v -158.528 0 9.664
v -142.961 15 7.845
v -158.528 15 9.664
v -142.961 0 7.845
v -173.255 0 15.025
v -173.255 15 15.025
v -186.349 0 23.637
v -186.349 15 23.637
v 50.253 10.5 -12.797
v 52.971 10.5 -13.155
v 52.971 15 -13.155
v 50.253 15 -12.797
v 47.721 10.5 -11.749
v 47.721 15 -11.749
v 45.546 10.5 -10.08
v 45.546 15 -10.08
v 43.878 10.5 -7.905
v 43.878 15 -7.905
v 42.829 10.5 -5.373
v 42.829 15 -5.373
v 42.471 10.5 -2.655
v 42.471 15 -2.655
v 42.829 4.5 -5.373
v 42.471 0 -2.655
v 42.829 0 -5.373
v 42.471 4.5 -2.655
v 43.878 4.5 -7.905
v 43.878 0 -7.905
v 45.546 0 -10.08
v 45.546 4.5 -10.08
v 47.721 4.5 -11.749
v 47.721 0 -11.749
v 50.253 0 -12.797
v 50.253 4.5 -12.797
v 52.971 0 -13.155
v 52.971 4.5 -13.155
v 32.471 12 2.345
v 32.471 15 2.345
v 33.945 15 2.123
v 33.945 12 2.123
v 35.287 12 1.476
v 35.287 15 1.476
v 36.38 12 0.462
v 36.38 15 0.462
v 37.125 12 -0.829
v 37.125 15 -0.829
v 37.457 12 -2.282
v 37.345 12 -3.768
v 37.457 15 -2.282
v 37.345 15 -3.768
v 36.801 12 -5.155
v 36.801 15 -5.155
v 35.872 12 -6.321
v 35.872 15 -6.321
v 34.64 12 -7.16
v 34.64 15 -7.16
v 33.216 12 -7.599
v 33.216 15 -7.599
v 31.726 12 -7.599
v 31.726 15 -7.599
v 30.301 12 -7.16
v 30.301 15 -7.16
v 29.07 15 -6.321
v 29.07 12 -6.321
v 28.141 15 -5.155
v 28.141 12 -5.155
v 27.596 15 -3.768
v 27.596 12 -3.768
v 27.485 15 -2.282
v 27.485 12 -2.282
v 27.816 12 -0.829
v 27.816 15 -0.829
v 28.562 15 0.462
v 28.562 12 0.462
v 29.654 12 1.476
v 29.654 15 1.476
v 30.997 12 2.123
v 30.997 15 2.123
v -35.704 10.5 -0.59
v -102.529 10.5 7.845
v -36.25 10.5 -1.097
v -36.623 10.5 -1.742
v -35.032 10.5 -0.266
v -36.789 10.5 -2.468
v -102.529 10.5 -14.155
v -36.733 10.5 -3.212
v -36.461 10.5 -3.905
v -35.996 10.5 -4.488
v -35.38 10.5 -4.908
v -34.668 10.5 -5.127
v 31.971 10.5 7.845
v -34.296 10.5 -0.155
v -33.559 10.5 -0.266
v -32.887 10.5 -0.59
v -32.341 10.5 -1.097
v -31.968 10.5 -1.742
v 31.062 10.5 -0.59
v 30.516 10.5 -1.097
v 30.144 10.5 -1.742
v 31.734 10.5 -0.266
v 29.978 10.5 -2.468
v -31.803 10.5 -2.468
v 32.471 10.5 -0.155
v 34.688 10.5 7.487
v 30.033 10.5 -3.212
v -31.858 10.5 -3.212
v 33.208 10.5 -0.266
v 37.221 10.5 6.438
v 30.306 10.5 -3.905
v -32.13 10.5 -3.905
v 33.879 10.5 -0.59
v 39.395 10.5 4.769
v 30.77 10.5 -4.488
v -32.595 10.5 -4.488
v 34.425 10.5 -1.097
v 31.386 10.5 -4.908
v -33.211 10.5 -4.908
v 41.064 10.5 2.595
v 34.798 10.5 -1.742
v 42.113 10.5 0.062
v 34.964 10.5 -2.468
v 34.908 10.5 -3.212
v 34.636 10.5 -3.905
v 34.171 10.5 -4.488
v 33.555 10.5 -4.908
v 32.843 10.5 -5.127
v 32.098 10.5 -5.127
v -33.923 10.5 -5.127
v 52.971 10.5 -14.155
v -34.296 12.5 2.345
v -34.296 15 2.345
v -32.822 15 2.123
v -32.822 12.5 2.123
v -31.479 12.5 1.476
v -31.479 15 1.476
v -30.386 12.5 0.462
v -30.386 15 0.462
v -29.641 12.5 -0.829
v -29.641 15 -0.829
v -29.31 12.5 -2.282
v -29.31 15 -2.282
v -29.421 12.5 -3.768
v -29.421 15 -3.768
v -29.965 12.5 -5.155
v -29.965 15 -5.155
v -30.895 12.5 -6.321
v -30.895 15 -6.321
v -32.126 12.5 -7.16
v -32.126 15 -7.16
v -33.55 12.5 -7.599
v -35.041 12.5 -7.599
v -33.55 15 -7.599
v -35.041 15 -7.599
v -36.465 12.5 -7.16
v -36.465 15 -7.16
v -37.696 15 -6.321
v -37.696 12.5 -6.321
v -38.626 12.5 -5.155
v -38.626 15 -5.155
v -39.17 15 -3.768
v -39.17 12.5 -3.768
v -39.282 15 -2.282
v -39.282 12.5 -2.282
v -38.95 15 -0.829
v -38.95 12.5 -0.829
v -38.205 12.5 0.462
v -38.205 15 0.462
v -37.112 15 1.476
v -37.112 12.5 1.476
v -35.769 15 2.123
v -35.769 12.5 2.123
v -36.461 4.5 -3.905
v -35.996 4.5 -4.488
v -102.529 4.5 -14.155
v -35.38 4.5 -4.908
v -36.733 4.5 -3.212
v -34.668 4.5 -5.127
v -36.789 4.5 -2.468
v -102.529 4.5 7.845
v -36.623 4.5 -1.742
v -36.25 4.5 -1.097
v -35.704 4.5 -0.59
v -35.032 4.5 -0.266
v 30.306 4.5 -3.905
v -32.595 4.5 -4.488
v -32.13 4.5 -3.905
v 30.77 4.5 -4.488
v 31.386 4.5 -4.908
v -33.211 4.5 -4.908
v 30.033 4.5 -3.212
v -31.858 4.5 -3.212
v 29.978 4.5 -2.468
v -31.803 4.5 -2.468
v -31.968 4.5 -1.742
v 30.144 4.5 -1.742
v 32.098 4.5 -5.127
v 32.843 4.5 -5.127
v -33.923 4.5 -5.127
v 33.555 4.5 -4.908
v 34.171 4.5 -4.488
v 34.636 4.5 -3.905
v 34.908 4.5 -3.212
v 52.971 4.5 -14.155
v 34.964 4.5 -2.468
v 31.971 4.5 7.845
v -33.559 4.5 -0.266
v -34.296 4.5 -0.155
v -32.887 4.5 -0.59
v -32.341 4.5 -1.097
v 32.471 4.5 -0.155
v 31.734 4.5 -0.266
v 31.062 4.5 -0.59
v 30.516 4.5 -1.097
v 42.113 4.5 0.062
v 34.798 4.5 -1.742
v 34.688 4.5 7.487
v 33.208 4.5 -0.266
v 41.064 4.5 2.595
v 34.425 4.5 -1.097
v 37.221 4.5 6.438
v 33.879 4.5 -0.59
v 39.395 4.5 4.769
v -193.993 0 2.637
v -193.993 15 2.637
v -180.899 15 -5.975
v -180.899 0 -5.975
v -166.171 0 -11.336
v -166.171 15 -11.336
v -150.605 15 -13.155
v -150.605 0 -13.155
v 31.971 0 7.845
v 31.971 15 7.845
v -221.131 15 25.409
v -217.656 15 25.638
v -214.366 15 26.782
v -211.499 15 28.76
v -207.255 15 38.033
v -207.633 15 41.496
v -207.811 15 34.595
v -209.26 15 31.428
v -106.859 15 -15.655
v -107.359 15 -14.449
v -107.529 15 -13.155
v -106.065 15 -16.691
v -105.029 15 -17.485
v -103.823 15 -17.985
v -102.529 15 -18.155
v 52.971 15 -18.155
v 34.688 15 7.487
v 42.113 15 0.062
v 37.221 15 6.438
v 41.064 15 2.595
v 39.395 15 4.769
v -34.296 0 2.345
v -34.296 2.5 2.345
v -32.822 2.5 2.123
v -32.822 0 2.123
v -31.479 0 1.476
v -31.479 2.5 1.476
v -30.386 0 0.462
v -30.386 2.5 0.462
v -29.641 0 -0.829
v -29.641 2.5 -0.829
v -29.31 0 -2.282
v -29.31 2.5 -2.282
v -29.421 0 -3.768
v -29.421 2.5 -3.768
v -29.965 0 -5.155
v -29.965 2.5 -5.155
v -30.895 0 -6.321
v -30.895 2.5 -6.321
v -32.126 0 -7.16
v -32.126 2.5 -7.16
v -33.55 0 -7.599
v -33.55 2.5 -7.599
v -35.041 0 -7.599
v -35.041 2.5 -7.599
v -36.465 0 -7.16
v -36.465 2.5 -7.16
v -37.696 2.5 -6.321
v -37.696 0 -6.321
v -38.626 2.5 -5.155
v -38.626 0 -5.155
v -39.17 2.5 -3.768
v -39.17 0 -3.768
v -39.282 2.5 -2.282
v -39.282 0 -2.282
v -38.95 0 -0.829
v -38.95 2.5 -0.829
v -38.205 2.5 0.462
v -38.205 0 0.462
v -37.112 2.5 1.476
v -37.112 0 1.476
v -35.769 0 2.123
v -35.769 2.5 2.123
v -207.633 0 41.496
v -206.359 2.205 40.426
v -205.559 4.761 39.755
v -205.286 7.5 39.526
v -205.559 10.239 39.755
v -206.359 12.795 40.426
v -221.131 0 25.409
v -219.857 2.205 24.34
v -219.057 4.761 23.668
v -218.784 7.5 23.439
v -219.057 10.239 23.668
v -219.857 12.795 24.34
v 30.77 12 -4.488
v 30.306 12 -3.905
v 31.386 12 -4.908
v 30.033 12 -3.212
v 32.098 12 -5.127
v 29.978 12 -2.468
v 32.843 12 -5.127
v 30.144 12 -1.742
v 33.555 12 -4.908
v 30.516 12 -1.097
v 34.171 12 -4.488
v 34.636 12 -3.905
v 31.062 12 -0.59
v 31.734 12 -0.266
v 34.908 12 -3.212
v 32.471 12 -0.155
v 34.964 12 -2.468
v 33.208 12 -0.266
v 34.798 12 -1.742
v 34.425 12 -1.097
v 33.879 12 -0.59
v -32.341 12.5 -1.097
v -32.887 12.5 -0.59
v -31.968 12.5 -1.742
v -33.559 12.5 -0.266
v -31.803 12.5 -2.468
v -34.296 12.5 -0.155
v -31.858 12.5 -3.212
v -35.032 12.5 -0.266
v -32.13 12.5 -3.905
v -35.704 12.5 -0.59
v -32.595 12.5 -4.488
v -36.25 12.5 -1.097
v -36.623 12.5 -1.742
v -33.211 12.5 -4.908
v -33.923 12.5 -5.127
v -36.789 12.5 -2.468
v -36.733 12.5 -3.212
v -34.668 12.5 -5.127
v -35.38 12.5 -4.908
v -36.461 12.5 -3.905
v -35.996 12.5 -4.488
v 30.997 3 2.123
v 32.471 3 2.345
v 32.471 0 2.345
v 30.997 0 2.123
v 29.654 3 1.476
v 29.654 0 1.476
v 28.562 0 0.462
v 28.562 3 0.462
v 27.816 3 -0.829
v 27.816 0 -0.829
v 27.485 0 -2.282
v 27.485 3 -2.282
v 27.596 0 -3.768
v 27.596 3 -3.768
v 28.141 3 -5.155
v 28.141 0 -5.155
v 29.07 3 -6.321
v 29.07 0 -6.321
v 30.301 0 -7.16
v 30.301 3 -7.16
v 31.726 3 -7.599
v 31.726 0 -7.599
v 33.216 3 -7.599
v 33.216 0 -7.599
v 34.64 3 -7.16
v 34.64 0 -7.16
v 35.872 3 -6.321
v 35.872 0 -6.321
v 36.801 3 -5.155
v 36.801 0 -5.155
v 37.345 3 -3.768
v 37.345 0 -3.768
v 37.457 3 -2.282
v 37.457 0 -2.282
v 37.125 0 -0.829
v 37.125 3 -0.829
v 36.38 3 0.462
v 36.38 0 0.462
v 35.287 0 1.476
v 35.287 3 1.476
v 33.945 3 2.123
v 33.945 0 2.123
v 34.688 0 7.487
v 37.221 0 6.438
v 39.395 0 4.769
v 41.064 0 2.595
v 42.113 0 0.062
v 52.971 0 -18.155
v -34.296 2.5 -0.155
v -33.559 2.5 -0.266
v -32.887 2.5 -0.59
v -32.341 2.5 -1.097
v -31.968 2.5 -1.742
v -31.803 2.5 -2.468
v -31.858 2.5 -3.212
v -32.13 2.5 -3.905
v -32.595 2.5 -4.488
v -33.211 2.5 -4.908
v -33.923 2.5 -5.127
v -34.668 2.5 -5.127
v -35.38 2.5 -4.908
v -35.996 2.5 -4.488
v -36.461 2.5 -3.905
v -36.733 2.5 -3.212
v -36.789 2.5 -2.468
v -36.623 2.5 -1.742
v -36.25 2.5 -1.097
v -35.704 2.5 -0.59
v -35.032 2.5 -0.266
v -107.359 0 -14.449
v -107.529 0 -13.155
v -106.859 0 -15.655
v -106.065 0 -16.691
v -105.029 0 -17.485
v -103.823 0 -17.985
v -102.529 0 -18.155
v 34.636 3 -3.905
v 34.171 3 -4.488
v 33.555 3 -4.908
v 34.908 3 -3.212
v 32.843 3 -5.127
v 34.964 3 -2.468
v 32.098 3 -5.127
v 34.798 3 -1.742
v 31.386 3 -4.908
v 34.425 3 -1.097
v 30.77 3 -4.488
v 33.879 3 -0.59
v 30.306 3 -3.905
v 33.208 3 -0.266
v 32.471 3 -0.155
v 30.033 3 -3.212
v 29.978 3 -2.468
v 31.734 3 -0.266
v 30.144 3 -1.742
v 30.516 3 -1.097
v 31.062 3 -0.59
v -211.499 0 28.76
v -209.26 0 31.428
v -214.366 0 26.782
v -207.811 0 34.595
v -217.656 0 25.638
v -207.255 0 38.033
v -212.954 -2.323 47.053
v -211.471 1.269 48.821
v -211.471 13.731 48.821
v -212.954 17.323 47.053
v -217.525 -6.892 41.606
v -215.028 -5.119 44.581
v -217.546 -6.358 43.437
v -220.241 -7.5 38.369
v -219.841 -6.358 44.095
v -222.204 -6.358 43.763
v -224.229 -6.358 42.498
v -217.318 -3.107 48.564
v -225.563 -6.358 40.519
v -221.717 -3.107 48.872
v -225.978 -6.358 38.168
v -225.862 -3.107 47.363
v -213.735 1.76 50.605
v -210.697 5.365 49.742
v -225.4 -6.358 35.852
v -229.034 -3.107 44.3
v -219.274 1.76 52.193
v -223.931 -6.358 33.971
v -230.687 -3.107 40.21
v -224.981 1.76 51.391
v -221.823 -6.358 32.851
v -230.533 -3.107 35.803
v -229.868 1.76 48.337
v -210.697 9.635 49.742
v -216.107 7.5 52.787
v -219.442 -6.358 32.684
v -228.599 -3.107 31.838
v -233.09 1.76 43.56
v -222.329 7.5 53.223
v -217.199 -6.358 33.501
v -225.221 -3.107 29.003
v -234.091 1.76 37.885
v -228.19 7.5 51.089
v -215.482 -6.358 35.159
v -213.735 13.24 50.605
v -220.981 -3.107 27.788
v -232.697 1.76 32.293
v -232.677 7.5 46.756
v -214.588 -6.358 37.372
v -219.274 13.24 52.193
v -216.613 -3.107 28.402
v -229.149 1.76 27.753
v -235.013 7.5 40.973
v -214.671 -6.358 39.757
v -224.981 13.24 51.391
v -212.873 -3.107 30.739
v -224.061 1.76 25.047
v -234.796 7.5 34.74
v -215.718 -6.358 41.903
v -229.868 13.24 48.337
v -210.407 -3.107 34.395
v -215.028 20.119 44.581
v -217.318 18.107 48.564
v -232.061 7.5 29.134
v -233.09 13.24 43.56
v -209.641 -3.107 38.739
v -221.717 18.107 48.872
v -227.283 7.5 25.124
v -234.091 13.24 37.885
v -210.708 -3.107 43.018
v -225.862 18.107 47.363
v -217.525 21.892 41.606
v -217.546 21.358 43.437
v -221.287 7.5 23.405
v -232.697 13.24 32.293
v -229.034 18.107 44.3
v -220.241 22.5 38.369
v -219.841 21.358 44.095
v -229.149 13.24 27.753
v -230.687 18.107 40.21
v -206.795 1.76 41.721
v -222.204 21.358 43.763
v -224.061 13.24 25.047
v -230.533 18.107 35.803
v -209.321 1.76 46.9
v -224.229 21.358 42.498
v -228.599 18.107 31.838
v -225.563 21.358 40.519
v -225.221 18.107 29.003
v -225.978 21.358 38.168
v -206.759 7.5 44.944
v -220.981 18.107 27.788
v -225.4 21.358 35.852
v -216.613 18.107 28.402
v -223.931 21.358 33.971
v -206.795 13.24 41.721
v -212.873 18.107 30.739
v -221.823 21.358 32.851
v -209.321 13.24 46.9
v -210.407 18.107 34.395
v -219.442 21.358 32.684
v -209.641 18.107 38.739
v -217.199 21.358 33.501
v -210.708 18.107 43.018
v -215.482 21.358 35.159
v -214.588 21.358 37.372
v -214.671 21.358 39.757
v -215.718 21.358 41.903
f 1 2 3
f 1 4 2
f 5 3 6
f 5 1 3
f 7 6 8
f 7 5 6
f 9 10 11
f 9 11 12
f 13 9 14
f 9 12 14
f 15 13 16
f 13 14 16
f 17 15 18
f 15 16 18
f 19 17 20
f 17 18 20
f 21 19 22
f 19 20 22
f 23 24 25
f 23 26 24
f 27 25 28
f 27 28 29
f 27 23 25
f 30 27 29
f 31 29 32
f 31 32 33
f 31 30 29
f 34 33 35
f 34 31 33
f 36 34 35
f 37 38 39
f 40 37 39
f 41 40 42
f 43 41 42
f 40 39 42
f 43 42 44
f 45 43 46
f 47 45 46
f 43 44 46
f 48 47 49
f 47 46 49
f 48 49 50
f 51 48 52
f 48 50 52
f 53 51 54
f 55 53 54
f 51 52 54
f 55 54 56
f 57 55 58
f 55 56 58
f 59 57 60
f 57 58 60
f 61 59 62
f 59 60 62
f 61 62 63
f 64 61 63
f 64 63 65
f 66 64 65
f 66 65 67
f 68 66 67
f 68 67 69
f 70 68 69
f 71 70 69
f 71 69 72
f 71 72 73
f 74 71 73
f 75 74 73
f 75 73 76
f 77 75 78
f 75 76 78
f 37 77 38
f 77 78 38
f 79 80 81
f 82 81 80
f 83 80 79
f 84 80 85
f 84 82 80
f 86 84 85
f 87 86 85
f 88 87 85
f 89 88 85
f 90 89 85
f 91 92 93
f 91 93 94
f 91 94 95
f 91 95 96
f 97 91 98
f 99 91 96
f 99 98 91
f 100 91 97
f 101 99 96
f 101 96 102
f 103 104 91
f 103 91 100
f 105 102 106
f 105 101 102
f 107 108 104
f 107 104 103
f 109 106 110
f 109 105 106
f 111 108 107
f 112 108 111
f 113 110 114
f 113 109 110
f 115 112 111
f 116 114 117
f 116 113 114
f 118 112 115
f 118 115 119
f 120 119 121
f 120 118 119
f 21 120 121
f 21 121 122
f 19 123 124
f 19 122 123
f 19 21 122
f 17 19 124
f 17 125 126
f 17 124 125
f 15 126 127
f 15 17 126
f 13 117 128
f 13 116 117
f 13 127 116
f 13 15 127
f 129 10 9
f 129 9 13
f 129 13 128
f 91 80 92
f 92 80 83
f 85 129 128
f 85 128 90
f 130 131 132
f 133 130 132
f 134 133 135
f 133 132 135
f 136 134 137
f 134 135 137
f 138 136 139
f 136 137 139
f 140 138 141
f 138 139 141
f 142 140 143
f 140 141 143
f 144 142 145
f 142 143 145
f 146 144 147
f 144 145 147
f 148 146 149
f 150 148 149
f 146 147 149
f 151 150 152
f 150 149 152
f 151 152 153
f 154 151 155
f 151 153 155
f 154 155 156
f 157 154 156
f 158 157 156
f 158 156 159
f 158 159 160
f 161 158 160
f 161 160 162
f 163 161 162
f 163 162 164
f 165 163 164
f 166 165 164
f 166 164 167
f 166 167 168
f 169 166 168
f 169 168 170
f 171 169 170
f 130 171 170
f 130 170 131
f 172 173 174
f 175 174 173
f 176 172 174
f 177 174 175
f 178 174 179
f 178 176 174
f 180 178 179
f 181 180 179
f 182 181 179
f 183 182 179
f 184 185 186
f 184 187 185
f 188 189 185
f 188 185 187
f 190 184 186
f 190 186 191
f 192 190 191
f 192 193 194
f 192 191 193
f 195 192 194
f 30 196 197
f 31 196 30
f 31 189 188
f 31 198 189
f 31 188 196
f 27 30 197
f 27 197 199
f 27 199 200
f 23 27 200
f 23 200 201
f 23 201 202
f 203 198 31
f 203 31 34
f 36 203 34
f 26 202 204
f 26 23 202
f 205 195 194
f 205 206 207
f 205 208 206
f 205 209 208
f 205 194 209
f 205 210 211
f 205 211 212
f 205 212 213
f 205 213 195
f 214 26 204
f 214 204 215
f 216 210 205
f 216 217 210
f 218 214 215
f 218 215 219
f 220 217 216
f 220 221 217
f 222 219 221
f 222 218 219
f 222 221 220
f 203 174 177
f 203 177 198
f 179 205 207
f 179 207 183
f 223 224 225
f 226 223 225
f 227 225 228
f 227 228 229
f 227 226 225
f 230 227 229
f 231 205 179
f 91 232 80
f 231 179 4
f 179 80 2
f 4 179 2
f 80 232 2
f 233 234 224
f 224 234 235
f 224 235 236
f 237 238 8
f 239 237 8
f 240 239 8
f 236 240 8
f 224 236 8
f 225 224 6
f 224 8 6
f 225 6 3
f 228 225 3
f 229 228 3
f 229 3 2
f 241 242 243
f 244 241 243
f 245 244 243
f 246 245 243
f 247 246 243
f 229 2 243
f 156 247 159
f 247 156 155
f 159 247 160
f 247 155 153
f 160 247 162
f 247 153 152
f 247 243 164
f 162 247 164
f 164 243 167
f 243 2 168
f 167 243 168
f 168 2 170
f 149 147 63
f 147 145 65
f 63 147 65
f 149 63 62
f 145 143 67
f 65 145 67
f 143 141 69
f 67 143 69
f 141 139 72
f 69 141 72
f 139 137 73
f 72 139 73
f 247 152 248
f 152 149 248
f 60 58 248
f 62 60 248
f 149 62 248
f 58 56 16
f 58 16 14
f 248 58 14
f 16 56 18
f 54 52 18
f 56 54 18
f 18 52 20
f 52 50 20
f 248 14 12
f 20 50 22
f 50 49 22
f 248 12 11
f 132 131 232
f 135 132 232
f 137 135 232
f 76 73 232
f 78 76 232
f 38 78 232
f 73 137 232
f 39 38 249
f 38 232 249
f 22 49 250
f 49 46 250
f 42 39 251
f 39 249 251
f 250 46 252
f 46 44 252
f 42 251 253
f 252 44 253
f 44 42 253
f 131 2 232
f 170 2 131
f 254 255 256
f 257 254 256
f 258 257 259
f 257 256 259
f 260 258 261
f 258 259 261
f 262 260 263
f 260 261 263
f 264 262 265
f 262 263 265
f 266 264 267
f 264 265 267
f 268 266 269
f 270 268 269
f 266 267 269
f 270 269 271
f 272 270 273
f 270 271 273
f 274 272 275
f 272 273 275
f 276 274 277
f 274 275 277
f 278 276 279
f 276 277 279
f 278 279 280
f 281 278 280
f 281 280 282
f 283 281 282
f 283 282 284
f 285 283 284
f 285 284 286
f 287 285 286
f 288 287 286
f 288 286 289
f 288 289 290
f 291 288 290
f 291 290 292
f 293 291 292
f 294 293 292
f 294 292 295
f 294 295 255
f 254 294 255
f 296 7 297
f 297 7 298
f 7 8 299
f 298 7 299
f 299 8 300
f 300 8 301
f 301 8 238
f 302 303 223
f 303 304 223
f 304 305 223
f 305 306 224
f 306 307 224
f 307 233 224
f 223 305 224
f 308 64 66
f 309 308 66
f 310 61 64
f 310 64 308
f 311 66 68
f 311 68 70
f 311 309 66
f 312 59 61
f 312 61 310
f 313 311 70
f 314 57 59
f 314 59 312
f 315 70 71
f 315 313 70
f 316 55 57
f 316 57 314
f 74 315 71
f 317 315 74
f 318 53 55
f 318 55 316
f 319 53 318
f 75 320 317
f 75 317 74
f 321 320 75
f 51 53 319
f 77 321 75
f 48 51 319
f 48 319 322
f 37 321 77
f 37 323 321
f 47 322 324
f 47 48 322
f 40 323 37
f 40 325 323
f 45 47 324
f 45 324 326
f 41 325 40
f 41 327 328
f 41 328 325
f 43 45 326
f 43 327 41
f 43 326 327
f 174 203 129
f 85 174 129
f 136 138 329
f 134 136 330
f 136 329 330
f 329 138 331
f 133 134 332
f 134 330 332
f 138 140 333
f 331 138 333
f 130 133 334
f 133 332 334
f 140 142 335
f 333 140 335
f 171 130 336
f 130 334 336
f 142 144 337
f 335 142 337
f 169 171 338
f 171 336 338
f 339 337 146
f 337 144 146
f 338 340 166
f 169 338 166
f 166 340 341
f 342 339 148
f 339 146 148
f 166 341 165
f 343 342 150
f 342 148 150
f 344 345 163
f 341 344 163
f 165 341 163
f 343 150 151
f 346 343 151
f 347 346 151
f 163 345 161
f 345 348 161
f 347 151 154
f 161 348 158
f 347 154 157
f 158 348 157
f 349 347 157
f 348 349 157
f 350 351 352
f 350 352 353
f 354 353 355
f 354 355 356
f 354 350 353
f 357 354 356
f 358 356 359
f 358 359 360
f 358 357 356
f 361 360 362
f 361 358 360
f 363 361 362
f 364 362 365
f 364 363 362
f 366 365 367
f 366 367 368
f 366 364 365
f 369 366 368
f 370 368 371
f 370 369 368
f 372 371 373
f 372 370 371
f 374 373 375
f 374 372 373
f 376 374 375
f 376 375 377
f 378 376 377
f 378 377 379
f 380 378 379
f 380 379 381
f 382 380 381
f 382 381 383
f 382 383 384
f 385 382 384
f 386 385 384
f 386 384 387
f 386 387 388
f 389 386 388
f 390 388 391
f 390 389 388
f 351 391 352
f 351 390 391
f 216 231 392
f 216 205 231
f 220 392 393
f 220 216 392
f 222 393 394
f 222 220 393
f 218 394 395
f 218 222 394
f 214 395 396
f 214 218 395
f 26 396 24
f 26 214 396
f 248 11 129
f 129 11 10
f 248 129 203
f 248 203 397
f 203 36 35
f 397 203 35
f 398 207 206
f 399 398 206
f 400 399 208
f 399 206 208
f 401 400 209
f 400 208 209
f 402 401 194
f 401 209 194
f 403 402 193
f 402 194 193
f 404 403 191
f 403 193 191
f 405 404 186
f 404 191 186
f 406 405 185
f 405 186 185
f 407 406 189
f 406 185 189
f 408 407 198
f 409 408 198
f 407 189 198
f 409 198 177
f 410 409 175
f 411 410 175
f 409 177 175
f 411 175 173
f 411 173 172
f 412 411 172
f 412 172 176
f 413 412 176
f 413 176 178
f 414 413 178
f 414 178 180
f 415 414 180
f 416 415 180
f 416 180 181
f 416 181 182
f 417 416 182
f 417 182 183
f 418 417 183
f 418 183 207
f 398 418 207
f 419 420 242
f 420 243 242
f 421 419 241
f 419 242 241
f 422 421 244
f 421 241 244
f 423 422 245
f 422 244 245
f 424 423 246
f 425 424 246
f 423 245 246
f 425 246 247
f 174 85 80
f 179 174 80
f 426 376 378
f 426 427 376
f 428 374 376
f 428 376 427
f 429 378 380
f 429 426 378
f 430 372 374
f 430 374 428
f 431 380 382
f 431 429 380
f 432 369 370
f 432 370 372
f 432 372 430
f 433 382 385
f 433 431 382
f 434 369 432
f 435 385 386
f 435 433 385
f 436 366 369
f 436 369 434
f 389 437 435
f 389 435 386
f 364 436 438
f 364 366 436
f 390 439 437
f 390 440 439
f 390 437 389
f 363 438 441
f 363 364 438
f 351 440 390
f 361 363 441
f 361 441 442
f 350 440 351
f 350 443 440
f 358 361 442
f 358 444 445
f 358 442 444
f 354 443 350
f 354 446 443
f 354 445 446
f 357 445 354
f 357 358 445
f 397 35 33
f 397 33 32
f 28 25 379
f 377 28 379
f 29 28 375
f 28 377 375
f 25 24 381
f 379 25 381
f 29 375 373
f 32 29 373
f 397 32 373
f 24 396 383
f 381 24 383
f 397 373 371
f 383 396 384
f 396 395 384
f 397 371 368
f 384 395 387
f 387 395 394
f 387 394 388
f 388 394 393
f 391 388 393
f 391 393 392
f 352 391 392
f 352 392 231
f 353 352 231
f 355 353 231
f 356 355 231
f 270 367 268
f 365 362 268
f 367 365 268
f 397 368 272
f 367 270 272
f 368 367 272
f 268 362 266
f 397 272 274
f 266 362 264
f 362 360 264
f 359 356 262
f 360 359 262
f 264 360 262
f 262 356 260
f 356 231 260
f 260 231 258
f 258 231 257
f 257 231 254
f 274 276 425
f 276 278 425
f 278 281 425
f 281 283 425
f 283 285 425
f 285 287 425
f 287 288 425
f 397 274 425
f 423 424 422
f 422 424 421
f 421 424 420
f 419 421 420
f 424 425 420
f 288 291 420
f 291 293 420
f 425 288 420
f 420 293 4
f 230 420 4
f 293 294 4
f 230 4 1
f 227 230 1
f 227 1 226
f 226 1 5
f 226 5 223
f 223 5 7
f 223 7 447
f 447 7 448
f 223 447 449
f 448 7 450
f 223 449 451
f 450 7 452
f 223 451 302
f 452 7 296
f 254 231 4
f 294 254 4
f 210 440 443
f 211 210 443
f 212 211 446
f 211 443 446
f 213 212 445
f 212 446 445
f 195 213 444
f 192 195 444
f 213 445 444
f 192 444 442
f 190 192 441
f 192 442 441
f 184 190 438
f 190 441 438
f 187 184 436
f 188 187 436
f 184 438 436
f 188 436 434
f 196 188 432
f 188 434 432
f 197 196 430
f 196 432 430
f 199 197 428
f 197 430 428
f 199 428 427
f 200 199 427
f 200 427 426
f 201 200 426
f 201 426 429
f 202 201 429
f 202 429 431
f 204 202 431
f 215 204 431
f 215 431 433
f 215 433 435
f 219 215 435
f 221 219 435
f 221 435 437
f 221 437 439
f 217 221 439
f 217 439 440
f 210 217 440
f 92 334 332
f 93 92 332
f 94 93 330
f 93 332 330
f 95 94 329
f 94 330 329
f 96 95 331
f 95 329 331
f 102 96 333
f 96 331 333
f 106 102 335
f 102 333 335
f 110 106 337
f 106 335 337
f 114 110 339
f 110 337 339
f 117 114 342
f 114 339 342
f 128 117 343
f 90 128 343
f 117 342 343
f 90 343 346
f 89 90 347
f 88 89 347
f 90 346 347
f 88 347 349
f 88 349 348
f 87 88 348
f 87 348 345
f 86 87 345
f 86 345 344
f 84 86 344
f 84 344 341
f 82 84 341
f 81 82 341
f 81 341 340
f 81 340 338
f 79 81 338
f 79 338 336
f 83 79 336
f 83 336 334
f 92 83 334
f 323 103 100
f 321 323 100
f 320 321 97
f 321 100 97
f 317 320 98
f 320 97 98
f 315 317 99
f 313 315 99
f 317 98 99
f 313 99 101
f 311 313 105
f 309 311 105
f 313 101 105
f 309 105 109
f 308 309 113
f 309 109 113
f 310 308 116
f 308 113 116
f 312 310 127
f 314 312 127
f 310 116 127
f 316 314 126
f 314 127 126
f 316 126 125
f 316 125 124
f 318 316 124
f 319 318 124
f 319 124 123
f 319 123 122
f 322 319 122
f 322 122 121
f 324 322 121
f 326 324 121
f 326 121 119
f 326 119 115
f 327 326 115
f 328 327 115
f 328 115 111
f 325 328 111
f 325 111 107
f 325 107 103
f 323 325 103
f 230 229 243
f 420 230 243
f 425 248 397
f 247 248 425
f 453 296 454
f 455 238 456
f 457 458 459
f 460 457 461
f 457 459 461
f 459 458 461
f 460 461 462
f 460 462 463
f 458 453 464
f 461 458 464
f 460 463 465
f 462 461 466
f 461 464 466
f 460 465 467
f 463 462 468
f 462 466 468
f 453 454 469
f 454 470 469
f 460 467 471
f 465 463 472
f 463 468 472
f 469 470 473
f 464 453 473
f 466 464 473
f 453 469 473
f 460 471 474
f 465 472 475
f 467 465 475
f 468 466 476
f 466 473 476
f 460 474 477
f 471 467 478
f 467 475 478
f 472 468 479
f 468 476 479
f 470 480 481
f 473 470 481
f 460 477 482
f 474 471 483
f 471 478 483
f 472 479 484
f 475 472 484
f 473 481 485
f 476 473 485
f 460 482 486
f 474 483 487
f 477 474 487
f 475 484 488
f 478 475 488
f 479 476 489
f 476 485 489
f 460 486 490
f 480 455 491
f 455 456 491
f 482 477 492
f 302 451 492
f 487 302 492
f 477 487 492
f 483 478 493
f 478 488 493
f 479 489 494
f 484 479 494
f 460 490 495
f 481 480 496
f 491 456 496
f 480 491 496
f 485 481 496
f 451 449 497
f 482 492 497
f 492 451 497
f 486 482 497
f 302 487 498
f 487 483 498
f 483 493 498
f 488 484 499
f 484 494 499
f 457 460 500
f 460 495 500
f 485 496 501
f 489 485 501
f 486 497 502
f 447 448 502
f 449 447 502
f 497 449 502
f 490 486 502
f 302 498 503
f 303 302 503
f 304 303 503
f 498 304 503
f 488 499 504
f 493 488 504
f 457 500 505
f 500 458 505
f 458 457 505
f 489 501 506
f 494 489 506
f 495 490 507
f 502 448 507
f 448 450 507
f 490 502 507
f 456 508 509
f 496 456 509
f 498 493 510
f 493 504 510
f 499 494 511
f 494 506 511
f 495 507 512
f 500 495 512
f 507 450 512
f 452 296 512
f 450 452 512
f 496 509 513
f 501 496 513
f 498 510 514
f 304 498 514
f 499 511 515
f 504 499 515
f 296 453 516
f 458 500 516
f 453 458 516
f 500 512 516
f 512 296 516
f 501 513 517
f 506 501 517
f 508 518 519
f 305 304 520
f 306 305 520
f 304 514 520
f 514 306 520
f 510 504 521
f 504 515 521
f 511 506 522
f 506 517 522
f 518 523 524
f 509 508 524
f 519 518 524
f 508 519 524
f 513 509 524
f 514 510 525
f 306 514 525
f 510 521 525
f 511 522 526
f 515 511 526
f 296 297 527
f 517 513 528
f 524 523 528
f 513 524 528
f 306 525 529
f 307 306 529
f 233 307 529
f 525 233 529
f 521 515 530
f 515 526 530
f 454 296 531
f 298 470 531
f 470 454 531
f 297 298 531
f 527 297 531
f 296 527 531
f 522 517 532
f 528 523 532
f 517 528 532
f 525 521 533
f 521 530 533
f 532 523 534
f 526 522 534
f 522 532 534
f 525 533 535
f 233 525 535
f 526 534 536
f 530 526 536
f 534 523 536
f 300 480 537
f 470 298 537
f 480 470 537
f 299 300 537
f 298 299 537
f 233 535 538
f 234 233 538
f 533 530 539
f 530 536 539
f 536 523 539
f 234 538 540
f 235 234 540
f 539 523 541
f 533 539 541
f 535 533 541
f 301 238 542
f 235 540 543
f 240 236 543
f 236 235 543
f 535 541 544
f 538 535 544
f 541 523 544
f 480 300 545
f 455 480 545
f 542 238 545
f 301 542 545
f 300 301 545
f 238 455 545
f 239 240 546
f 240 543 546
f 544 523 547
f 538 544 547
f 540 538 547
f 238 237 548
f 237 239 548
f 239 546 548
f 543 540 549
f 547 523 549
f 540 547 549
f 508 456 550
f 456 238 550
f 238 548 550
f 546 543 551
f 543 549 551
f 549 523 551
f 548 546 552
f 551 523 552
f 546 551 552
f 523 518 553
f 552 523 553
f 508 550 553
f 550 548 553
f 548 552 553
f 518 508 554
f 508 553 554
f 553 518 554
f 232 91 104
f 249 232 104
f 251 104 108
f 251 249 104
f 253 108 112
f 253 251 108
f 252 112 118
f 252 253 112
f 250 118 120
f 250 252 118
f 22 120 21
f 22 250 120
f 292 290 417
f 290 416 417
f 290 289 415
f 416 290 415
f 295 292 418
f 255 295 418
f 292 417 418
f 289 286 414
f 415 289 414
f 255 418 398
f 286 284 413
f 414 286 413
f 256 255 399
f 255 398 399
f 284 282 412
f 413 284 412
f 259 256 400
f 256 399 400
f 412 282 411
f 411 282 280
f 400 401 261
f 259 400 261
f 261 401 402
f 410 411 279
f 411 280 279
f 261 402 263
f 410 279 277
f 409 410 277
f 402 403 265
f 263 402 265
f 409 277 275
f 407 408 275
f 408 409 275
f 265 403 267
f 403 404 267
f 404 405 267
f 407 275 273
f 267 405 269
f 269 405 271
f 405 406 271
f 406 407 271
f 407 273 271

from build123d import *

# Parameters (mm, degrees)
SKETCH_1_W          = 150
SKETCH_1_H          = 21.000000000000004
EXTRUDE_1_DEPTH     = 15
CUT_EXTRUDE_1_DEPTH = 145
SKETCH_3_R          = 5.000000000000004
CUT_EXTRUDE_2_DEPTH = 3
CUT_EXTRUDE_START   = -3
SKETCH_4_R          = 5.000000000000001
CUT_EXTRUDE_3_DEPTH = 3
SKETCH_5_R          = 2.4999999999999987
CUT_EXTRUDE_4_DEPTH = 20
SKETCH_6_R          = 5.000000000000001
CUT_EXTRUDE_5_DEPTH = 20
SKETCH_7_R          = 5.999999999999998
EXTRUDE_2_DEPTH     = 2
SKETCH_8_R          = 6.000000000000003
EXTRUDE_3_DEPTH     = 2
SKETCH_9_R          = 2.500000000000002
CUT_EXTRUDE_6_DEPTH = 20
EXTRUDE_5_DEPTH     = 15
EXTRUDE_6_DEPTH     = 5
FILLET_1_R          = 5
FILLET_2_R          = 10.5
FILLET_3_R          = 67.5
SKETCH_17_W         = 22.000000000000004
SKETCH_17_H         = 5.999999999999995
CUT_EXTRUDE_7_DEPTH = 200


with BuildPart() as part:
    # 草图1 → 凸台-拉伸1 (new body)
    with BuildSketch(Plane(origin=(0, 0, 0), x_dir=(1, 0, 0), z_dir=(0, 1, 0))):
        with Locations((-32.52921535893155, 2.6552587646076753)):
            Rectangle(SKETCH_1_W, SKETCH_1_H)
    extrude(amount=EXTRUDE_1_DEPTH)

    # 草图2 → 切除-拉伸1 (cut)
    with BuildSketch(Plane(origin=(42.470784641068455, 0, 0), x_dir=(0, 0, -1), z_dir=(1, 0, 0))):
        Polygon((-7.844741235392326, 10.499999999999998), (13.155258764607675, 10.499999999999998), (13.155258764607675, 4.500000000000001), (-7.844741235392326, 4.5), align=None)
    extrude(amount=-CUT_EXTRUDE_1_DEPTH, mode=Mode.SUBTRACT)

    # 草图3 → 切除-拉伸2 (cut)
    with BuildSketch(Plane(origin=(0, 15, 0), x_dir=(1, 0, 0), z_dir=(0, 1, 0))):
        with Locations(Location((32.47078464106845, 2.655258764607675, 0), (0, 0, 270))):
            Circle(SKETCH_3_R)
    extrude(amount=-CUT_EXTRUDE_2_DEPTH, mode=Mode.SUBTRACT)

    # 草图4 → 切除-拉伸3 (cut)
    with BuildSketch(Plane(origin=(0, 0, 0), x_dir=(-1, 0, 0), z_dir=(0, -1, 0)).offset(CUT_EXTRUDE_START)):
        with Locations(Location((-32.47078464106845, 2.655258764607675, 0), (0, 0, 270))):
            Circle(SKETCH_4_R)
    extrude(amount=CUT_EXTRUDE_3_DEPTH, mode=Mode.SUBTRACT)

    # 草图5 → 切除-拉伸4 (cut)
    with BuildSketch(Plane(origin=(0, 3, 0), x_dir=(-1, 0, 0), z_dir=(0, -1, 0))):
        with Locations(Location((-32.47078464106845, 2.655258764607675, 0), (0, 0, 270))):
            Circle(SKETCH_5_R)
    extrude(amount=-CUT_EXTRUDE_4_DEPTH, mode=Mode.SUBTRACT)

    # 草图6 → 切除-拉伸5 (cut)
    with BuildSketch(Plane(origin=(0, 15, 0), x_dir=(1, 0, 0), z_dir=(0, 1, 0))):
        with Locations(Location((-34.295534758931545, 2.655258764607675, 0), (0, 0, 270))):
            Circle(SKETCH_6_R)
    extrude(amount=-CUT_EXTRUDE_5_DEPTH, mode=Mode.SUBTRACT)

    # 草图7 → 凸台-拉伸2 (add)
    with BuildSketch(Plane(origin=(0, 4.5, 1.9e-16), x_dir=(1, 0, 0), z_dir=(0, 1, 4e-17))):
        with Locations((-34.295534758931545, 2.655258764607675)):
            Circle(SKETCH_7_R)
    extrude(amount=-EXTRUDE_2_DEPTH)

    # 草图8 → 凸台-拉伸3 (add)
    with BuildSketch(Plane(origin=(0, 10.499999999999998, 0), x_dir=(-1, 0, 0), z_dir=(0, -1, 0))):
        with Locations((34.295534758931545, 2.655258764607675)):
            Circle(SKETCH_8_R)
    extrude(amount=-EXTRUDE_3_DEPTH)

    # 草图9 → 切除-拉伸6 (cut)
    with BuildSketch(Plane(origin=(0, 12.499999999999998, 0), x_dir=(1, 0, 0), z_dir=(0, 1, 0))):
        with Locations(Location((-34.295534758931545, 2.655258764607675, 0), (0, 0, 270))):
            Circle(SKETCH_9_R)
    extrude(amount=-CUT_EXTRUDE_6_DEPTH, mode=Mode.SUBTRACT)



with BuildPart() as body_2:
    # 草图12 → 凸台-拉伸5 (new body)
    with BuildSketch(Plane(origin=(0, 15, 0), x_dir=(1, 0, 0), z_dir=(0, 1, 0))):
        Polygon((-107.52921535893154, -7.844741235392326), (-167.52921535893154, -7.844741235392335), (-213.49188194607015, -46.41199781658475), (-226.9904217494875, -30.32506451108624), (-175.17259027852143, 13.155258764607666), (-107.52921535893154, 13.155258764607675), align=None)
    extrude(amount=-EXTRUDE_5_DEPTH)

    # 草图13 → 旋转3 (revolve)
    with BuildSketch(Plane(origin=(-148.13562673762334, 0, 124.30054975975524), x_dir=(0.6427876096865401, 0, 0.7660444431189775), z_dir=(-0.7660444431189775, 0, 0.6427876096865401))):
        with BuildLine():
            Line((-112.17628346215061, 22.5), (-112.17628346215061, -7.5))
            ThreePointArc((-112.17628346215061, -7.5), (-97.17628346215061, 7.5), (-112.17628346215061, 22.5))
        make_face()
    revolve(axis=Axis((-220.2411518477789, 22.5, 38.36853116383551), (0, -1, 0)))


with BuildPart() as part_1:
    add(part.part)

    add(body_2.part)  # 凸台-拉伸6 merges body 2
    # 草图14 → 凸台-拉伸6 (add)
    with BuildSketch(Plane(origin=(0, 0, -13.155258764607675), x_dir=(-1, 0, 0), z_dir=(0, 0, -1))):
        Polygon((107.52921535893154, 15), (-52.97078464106847, 14.99999999999998), (-52.97078464106847, -3.99e-14), (107.52921535893154, 0), align=None)
    extrude(amount=EXTRUDE_6_DEPTH)

    # 圆角1
    fillet_1_edges = [part_1.edges().sort_by_distance(p)[0] for p in [
        (-107.52921535893154, 7.5, -18.155258764607673),
    ]]
    fillet(fillet_1_edges, radius=FILLET_1_R - 0.0001)  # a hair under: the kernel refuses the full size

    # 圆角2
    fillet_2_edges = [part_1.edges().sort_by_distance(p)[0] for p in [
        (42.470784641068455, 12.75, -13.155258764607675),
    ]]
    fillet(fillet_2_edges, radius=FILLET_2_R - 0.0001)  # a hair under: the kernel refuses the full size
    fillet_2_2_edges = [part_1.edges().sort_by_distance(p)[0] for p in [
        (42.470784641068455, 2.2500000000000004, -13.155258764607675),
    ]]
    fillet(fillet_2_2_edges, radius=FILLET_2_R - 0.0001)  # a hair under: the kernel refuses the full size
    fillet_2_3_edges = [part_1.edges().sort_by_distance(p)[0] for p in [
        (42.470784641068455, 2.25, 7.844741235392326),
    ]]
    fillet(fillet_2_3_edges, radius=FILLET_2_R)
    fillet_2_4_edges = [part_1.edges().sort_by_distance(p)[0] for p in [
        (42.470784641068455, 12.75, 7.844741235392326),
    ]]
    fillet(fillet_2_4_edges, radius=FILLET_2_R)

    # 圆角3
    fillet_3_edges = [part_1.edges().sort_by_distance(p)[0] for p in [
        (-167.52921535893154, 7.5, 7.844741235392335),
        (-175.17259027852143, 7.5, -13.155258764607666),
    ]]
    fillet(fillet_3_edges, radius=FILLET_3_R)

    # 草图17 → 切除-拉伸7 (cut)
    with BuildSketch(Plane(origin=(-102.52921535893152, 0, 0), x_dir=(0, 0, -1), z_dir=(1, 0, 0))):
        with Locations((3.1552587646076753, 7.500000000000001)):
            Rectangle(SKETCH_17_W, SKETCH_17_H)
    extrude(amount=CUT_EXTRUDE_7_DEPTH, mode=Mode.SUBTRACT)


solid = part_1.part
